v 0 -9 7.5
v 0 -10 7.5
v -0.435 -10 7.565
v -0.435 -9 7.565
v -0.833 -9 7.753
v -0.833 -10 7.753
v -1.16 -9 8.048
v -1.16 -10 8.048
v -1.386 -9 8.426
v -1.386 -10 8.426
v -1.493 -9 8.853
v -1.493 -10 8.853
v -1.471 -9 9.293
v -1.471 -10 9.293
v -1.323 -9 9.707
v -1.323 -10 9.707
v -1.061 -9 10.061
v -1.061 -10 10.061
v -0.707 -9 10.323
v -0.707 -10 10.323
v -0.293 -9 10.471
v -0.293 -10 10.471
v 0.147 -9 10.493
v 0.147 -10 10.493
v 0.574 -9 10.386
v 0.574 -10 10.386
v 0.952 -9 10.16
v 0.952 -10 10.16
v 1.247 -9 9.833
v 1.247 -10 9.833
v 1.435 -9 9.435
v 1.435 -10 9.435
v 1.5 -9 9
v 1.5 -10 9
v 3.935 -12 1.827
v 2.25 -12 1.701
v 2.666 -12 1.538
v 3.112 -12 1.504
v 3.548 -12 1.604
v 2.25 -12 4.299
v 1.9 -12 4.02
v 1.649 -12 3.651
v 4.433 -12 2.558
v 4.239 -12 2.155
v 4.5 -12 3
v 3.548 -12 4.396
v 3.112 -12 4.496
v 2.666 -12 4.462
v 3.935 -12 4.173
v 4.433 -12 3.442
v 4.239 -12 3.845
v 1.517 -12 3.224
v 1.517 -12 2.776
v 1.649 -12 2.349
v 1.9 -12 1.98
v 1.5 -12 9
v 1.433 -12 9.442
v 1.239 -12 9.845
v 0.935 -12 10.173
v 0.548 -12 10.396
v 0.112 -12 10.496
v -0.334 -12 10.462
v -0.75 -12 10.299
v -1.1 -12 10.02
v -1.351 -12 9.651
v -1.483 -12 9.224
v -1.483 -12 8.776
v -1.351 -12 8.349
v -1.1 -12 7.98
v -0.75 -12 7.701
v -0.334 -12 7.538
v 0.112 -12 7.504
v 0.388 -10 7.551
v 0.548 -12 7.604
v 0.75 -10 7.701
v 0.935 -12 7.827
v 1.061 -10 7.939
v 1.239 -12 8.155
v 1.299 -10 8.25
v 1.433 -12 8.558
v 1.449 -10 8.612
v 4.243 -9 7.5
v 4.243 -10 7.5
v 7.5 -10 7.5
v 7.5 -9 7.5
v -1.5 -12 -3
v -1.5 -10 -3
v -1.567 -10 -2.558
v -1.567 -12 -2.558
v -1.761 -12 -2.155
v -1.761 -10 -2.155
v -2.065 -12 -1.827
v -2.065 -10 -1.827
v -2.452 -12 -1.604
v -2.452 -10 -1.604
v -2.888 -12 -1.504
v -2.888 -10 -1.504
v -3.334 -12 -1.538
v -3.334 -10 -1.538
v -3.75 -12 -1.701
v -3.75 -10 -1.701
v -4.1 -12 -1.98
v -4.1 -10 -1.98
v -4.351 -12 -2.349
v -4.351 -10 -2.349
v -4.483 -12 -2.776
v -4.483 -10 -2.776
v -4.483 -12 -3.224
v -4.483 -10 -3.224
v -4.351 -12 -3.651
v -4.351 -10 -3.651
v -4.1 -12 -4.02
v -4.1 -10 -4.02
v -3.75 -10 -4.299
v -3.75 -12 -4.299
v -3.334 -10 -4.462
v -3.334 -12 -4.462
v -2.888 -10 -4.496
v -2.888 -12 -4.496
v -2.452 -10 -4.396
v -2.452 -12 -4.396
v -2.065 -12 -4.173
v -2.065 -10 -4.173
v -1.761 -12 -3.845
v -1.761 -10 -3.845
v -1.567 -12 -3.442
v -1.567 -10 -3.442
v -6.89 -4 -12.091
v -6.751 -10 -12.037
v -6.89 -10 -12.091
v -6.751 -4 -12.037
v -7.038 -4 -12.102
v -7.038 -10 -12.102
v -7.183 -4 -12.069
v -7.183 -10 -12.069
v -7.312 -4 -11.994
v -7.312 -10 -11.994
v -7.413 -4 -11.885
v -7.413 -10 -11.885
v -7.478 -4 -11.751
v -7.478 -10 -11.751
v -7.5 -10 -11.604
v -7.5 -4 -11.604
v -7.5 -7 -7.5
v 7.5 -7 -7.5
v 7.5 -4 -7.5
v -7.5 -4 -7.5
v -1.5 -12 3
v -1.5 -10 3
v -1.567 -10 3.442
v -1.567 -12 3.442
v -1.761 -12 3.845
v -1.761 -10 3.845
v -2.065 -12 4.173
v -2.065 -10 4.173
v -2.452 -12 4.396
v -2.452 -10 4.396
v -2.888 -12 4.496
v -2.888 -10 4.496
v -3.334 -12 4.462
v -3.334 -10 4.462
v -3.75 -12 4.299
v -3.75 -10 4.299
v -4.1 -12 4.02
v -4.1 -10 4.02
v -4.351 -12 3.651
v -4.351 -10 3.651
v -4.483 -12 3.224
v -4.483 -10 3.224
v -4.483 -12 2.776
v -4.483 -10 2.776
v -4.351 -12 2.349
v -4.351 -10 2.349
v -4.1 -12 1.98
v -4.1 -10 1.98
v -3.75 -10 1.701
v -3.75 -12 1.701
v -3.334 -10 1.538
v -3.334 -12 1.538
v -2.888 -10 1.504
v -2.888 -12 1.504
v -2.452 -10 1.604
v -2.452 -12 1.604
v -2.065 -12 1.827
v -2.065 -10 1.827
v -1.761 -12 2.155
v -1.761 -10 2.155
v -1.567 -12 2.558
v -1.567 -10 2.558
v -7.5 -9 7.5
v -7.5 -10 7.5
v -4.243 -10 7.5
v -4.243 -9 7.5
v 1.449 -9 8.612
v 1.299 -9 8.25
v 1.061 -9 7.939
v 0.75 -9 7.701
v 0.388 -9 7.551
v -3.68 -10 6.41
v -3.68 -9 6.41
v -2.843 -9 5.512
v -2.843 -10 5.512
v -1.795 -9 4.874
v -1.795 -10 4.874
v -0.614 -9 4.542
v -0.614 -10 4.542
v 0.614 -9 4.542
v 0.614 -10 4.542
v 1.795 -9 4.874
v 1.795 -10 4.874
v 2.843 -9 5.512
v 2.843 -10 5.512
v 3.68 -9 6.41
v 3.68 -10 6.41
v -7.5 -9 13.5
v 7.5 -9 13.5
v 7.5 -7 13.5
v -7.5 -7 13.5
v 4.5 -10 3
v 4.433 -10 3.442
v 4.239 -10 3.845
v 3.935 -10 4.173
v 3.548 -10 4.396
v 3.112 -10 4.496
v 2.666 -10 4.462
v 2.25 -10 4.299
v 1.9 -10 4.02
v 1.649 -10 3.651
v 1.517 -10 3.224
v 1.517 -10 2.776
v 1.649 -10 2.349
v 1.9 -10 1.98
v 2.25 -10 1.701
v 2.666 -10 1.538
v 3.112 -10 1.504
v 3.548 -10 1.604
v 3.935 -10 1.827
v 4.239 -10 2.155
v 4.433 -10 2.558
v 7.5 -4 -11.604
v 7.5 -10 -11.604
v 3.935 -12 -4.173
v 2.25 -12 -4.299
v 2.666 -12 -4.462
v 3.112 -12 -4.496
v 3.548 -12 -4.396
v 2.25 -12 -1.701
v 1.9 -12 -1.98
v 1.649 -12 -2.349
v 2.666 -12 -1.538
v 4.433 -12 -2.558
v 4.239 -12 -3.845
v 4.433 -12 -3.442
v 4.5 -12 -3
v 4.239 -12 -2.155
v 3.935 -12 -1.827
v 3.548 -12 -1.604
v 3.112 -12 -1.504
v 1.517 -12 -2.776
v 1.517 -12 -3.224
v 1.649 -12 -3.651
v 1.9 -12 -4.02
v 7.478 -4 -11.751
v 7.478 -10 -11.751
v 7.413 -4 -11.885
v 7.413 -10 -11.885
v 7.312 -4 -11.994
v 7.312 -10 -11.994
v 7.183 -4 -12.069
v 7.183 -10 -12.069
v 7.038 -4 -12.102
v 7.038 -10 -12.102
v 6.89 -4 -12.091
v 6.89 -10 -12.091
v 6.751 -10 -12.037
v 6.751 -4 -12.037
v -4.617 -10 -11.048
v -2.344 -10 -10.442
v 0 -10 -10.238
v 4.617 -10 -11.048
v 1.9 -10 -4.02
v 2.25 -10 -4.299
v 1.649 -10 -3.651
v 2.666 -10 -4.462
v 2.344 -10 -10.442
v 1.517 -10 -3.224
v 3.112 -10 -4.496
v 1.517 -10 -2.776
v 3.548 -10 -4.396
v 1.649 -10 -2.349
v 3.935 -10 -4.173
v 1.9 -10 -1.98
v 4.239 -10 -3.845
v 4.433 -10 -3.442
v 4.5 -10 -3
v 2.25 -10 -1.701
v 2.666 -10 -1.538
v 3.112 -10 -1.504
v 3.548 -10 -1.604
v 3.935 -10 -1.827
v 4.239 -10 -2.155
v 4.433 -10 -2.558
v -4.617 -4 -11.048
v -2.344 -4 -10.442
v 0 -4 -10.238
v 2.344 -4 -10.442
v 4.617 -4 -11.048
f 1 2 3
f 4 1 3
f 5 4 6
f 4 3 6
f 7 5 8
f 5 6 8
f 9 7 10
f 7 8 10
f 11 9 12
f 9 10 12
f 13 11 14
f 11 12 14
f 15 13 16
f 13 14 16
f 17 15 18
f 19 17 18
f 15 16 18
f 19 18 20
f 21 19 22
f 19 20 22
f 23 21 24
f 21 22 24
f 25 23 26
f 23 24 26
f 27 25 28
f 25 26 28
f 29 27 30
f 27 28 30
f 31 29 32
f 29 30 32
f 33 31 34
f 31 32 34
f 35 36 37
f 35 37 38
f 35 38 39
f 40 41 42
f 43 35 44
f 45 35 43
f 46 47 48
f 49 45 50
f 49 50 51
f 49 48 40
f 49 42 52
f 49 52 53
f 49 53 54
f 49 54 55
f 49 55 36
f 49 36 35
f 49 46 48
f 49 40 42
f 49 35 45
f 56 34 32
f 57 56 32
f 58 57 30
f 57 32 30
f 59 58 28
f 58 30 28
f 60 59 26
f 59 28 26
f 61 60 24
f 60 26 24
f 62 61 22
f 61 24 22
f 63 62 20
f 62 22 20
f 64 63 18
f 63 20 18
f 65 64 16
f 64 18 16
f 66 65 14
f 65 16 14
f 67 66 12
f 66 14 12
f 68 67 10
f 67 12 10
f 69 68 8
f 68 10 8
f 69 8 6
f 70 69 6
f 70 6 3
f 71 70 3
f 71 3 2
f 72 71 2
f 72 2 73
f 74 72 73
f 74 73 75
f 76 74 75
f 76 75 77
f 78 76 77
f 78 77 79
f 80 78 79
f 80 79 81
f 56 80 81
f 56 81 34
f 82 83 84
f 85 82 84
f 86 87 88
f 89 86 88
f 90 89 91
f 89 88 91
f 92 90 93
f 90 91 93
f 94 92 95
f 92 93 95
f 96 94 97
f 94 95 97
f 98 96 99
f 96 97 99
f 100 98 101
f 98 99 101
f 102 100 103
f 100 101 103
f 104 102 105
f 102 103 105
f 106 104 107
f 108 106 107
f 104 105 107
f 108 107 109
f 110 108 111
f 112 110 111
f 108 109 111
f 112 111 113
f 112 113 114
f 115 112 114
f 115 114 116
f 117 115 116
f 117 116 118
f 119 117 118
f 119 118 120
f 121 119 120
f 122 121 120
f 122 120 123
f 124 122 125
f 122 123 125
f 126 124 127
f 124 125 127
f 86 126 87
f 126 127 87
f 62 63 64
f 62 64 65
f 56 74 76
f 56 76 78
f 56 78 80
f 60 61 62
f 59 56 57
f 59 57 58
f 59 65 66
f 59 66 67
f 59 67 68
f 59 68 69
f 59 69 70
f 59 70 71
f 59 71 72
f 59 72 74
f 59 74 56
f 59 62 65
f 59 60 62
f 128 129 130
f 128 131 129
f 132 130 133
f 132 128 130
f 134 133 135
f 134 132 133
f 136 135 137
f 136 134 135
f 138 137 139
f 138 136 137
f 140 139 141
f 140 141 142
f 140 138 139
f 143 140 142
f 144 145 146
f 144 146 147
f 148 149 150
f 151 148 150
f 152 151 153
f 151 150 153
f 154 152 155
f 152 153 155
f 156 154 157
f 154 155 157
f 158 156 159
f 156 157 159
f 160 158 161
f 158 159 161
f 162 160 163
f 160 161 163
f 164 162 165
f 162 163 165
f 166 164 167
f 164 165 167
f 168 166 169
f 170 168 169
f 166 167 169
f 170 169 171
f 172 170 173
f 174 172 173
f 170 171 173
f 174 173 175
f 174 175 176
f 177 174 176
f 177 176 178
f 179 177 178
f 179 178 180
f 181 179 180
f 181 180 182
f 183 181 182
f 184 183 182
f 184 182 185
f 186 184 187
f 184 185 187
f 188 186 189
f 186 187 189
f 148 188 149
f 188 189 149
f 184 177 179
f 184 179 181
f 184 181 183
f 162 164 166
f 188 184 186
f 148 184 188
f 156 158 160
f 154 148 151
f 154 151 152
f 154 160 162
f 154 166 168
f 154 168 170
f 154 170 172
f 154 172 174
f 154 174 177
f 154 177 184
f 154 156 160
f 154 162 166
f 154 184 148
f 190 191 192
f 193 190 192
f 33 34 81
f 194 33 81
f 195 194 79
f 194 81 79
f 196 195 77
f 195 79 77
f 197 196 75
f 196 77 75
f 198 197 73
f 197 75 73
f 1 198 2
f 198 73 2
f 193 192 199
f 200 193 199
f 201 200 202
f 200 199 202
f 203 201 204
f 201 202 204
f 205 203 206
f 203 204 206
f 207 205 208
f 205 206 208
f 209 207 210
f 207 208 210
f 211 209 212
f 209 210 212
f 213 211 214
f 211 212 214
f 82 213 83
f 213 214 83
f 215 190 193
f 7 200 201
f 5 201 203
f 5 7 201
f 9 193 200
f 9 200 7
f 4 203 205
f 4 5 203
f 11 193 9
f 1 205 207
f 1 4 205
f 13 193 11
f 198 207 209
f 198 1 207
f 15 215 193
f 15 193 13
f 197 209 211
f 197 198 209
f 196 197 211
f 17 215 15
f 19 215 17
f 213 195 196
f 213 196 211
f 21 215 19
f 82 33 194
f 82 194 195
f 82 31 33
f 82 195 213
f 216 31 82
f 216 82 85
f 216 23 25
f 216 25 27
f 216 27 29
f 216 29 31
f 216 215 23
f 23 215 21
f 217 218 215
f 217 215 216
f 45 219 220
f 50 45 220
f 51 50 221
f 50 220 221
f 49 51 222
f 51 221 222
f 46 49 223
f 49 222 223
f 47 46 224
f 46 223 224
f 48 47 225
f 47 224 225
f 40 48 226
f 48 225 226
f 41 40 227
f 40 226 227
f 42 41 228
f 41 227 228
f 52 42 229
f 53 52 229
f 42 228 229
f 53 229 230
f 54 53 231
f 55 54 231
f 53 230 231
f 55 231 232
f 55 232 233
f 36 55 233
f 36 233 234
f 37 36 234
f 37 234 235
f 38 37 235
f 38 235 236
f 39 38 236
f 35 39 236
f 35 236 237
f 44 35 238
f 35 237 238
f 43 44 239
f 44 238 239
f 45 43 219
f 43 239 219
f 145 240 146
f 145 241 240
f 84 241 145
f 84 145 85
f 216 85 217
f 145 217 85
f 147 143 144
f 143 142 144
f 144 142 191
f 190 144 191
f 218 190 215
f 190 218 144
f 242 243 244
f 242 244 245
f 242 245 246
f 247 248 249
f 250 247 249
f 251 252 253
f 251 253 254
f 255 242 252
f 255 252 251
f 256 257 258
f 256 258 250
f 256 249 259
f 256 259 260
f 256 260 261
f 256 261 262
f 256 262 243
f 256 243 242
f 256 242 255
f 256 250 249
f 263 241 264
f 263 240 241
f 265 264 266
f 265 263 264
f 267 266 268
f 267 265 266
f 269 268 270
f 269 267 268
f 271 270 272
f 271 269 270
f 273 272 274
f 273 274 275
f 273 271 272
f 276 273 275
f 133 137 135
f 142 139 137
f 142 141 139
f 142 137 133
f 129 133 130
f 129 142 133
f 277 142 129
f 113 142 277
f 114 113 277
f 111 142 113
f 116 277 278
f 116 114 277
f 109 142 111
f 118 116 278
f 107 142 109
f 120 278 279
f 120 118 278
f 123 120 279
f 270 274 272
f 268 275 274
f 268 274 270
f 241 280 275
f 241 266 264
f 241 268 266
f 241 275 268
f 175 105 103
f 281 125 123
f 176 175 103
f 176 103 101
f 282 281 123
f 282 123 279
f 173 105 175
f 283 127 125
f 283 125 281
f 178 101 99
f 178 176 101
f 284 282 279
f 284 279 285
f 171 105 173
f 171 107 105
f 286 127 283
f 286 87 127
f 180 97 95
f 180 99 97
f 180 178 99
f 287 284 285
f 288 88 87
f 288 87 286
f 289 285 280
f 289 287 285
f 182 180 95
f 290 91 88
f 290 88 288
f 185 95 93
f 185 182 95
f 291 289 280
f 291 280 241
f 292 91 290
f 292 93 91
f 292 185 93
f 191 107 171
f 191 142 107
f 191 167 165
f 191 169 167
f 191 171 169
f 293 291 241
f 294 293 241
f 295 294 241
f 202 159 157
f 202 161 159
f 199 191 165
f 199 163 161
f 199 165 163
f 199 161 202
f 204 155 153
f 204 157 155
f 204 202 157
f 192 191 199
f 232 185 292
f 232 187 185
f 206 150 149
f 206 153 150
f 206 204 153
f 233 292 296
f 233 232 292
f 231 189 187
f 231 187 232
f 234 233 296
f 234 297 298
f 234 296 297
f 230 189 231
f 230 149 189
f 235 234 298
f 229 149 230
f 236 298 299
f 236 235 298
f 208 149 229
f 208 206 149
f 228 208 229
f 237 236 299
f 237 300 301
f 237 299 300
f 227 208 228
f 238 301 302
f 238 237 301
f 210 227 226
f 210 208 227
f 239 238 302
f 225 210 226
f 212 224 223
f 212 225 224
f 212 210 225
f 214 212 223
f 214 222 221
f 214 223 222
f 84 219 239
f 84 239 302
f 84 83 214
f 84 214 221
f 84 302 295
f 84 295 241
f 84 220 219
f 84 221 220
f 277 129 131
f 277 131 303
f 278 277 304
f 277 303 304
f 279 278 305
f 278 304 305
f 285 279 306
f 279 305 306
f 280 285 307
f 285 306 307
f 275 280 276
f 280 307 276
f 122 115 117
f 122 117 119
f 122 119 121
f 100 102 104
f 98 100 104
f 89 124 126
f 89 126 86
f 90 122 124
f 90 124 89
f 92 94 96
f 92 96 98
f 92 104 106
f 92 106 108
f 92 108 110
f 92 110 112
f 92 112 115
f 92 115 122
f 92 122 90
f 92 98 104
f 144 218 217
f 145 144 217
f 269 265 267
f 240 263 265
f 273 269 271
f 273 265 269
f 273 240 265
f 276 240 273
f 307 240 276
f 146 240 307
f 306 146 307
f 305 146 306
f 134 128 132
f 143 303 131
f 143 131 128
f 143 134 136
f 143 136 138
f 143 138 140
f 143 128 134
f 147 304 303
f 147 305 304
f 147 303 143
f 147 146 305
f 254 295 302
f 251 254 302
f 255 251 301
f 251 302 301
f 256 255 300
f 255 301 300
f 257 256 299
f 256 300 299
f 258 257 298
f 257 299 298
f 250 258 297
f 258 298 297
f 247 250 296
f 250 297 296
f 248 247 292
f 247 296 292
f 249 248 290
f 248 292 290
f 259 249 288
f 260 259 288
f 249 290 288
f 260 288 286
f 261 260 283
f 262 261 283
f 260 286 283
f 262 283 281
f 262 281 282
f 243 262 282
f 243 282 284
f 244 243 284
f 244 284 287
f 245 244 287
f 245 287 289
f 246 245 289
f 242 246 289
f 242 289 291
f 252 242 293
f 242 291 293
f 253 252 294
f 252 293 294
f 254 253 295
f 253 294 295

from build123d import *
from build123d import SkipClean  # not in build123d's __all__

# Parameters (mm, degrees)
F0_W      = 15
F0_H      = 15
F0_H_2    = 6
F1_DEPTH  = 10
F2_R      = 1.5
F3_DEPTH  = 2
F5_DEPTH  = 1
F6_R      = 1.5
F7_DEPTH  = 2
F8_W      = 15
F8_H      = 21
F9_DEPTH  = 7
F10_W     = 15
F10_H     = 3
F11_DEPTH = 5
F12_W     = 15
F12_H     = 5
F13_DEPTH = 3
F15_DEPTH = 25
F16_R     = 0.5


# Not quite as in the source:
# - after a boolean that leaves OpenCascade's solid faulty, fix() repairs it


with BuildPart() as f1:
    # F0 (on Front) → F1 (new body)
    with BuildSketch(Plane.XZ):
        Rectangle(F0_W, F0_H)
        with Locations((0, 10.5)):
            Rectangle(F0_W, F0_H_2)
    extrude(amount=F1_DEPTH)

    # F2 (on face) → F3 (join)
    with BuildSketch(Plane.XZ.offset(10)):
        with Locations((-3, 3)):
            Circle(F2_R)
        with Locations((-3, -3)):
            Circle(F2_R)
        with Locations((3, -3)):
            Circle(F2_R)
        with Locations((3, 3)):
            Circle(F2_R)
    extrude(amount=F3_DEPTH)

    # F4 (on face) → F5 (cut)
    with BuildSketch(Plane.XZ.offset(10)):
        with BuildLine():
            Line((-7.5, 13.5), (-7.5, 7.5))
            Line((-7.5, 7.5), (-4.2426406871, 7.5))
            ThreePointArc((-4.2426406871, 7.5), (-3.6742346142, 11.5980762114), (0, 13.5))
            Line((0, 13.5), (-7.5, 13.5))
        make_face()
        with BuildLine():
            ThreePointArc((0, 13.5), (-3.6742346142, 11.5980762114), (-4.2426406871, 7.5))
            Line((-4.2426406871, 7.5), (0, 7.5))
            Line((0, 7.5), (4.2426406871, 7.5))
            ThreePointArc((4.2426406871, 7.5), (4.4351935184, 8.2390410957), (4.5, 9))
            ThreePointArc((4.5, 9), (3.1819805153, 12.1819805153), (0, 13.5))
        make_face()
        with BuildLine():
            ThreePointArc((1.5, 9), (1.0606601718, 7.9393398282), (0, 7.5))
            ThreePointArc((0, 7.5), (-1.0606601718, 10.0606601718), (1.5, 9))
        make_face(mode=Mode.SUBTRACT)
        with BuildLine():
            Line((0, 7.5), (-4.2426406871, 7.5))
            ThreePointArc((-4.2426406871, 7.5), (0, 4.5), (4.2426406871, 7.5))
            Line((4.2426406871, 7.5), (0, 7.5))
        make_face()
        with BuildLine():
            Line((7.5, 13.5), (0, 13.5))
            ThreePointArc((0, 13.5), (3.1819805153, 12.1819805153), (4.5, 9))
            ThreePointArc((4.5, 9), (4.4351935184, 8.2390410957), (4.2426406871, 7.5))
            Line((4.2426406871, 7.5), (7.5, 7.5))
            Line((7.5, 7.5), (7.5, 13.5))
        make_face()
    extrude(amount=-F5_DEPTH, mode=Mode.SUBTRACT)

    # F6 (on face) → F7 (join)
    with BuildSketch(Plane.XZ.offset(10)):
        with Locations((0, 9)):
            Circle(F6_R)
    with SkipClean():  # cleaning this boolean's faces spoils the solid; the shape is the same uncleaned
        extrude(amount=F7_DEPTH)

    # F8 (on face) → F9 (cut)
    with BuildSketch(Plane(origin=(0, 0, 0), x_dir=(-1, 0, 0), z_dir=(0, 1, 0))):
        with Locations((0, 3)):
            Rectangle(F8_W, F8_H)
    extrude(amount=-F9_DEPTH, mode=Mode.SUBTRACT)

    add(f1.part.fix(), mode=Mode.REPLACE)

    # F10 (on face) → F11 (join)
    with BuildSketch(Plane(origin=(0, 0, -7.5), x_dir=(1, 0, 0), z_dir=(0, 0, -1))):
        with Locations((0, 8.5)):
            Rectangle(F10_W, F10_H)
    extrude(amount=F11_DEPTH)

    # F12 (on face) → F13 (join)
    with BuildSketch(Plane(origin=(0, -7, 0), x_dir=(-1, 0, 0), z_dir=(0, 1, 0))):
        with Locations((0, -10)):
            Rectangle(F12_W, F12_H)
    extrude(amount=F13_DEPTH)

    # F14 (on face) → F15 (cut)
    with BuildSketch(Plane(origin=(0, -4, 0), x_dir=(-1, 0, 0), z_dir=(0, 1, 0))):
        with BuildLine():
            Line((-7.5, -12.5), (7.5, -12.5))
            ThreePointArc((7.5, -12.5), (0, -10.237957932), (-7.5, -12.5))
        make_face()
    extrude(amount=-F15_DEPTH, mode=Mode.SUBTRACT)

    # F16
    f16_edges = [f1.edges().sort_by_distance(p)[0] for p in [
        (-7.5, -7, -12.5),
        (7.5, -7, -12.5),
    ]]
    fillet(f16_edges, radius=F16_R)


solid = f1.part
